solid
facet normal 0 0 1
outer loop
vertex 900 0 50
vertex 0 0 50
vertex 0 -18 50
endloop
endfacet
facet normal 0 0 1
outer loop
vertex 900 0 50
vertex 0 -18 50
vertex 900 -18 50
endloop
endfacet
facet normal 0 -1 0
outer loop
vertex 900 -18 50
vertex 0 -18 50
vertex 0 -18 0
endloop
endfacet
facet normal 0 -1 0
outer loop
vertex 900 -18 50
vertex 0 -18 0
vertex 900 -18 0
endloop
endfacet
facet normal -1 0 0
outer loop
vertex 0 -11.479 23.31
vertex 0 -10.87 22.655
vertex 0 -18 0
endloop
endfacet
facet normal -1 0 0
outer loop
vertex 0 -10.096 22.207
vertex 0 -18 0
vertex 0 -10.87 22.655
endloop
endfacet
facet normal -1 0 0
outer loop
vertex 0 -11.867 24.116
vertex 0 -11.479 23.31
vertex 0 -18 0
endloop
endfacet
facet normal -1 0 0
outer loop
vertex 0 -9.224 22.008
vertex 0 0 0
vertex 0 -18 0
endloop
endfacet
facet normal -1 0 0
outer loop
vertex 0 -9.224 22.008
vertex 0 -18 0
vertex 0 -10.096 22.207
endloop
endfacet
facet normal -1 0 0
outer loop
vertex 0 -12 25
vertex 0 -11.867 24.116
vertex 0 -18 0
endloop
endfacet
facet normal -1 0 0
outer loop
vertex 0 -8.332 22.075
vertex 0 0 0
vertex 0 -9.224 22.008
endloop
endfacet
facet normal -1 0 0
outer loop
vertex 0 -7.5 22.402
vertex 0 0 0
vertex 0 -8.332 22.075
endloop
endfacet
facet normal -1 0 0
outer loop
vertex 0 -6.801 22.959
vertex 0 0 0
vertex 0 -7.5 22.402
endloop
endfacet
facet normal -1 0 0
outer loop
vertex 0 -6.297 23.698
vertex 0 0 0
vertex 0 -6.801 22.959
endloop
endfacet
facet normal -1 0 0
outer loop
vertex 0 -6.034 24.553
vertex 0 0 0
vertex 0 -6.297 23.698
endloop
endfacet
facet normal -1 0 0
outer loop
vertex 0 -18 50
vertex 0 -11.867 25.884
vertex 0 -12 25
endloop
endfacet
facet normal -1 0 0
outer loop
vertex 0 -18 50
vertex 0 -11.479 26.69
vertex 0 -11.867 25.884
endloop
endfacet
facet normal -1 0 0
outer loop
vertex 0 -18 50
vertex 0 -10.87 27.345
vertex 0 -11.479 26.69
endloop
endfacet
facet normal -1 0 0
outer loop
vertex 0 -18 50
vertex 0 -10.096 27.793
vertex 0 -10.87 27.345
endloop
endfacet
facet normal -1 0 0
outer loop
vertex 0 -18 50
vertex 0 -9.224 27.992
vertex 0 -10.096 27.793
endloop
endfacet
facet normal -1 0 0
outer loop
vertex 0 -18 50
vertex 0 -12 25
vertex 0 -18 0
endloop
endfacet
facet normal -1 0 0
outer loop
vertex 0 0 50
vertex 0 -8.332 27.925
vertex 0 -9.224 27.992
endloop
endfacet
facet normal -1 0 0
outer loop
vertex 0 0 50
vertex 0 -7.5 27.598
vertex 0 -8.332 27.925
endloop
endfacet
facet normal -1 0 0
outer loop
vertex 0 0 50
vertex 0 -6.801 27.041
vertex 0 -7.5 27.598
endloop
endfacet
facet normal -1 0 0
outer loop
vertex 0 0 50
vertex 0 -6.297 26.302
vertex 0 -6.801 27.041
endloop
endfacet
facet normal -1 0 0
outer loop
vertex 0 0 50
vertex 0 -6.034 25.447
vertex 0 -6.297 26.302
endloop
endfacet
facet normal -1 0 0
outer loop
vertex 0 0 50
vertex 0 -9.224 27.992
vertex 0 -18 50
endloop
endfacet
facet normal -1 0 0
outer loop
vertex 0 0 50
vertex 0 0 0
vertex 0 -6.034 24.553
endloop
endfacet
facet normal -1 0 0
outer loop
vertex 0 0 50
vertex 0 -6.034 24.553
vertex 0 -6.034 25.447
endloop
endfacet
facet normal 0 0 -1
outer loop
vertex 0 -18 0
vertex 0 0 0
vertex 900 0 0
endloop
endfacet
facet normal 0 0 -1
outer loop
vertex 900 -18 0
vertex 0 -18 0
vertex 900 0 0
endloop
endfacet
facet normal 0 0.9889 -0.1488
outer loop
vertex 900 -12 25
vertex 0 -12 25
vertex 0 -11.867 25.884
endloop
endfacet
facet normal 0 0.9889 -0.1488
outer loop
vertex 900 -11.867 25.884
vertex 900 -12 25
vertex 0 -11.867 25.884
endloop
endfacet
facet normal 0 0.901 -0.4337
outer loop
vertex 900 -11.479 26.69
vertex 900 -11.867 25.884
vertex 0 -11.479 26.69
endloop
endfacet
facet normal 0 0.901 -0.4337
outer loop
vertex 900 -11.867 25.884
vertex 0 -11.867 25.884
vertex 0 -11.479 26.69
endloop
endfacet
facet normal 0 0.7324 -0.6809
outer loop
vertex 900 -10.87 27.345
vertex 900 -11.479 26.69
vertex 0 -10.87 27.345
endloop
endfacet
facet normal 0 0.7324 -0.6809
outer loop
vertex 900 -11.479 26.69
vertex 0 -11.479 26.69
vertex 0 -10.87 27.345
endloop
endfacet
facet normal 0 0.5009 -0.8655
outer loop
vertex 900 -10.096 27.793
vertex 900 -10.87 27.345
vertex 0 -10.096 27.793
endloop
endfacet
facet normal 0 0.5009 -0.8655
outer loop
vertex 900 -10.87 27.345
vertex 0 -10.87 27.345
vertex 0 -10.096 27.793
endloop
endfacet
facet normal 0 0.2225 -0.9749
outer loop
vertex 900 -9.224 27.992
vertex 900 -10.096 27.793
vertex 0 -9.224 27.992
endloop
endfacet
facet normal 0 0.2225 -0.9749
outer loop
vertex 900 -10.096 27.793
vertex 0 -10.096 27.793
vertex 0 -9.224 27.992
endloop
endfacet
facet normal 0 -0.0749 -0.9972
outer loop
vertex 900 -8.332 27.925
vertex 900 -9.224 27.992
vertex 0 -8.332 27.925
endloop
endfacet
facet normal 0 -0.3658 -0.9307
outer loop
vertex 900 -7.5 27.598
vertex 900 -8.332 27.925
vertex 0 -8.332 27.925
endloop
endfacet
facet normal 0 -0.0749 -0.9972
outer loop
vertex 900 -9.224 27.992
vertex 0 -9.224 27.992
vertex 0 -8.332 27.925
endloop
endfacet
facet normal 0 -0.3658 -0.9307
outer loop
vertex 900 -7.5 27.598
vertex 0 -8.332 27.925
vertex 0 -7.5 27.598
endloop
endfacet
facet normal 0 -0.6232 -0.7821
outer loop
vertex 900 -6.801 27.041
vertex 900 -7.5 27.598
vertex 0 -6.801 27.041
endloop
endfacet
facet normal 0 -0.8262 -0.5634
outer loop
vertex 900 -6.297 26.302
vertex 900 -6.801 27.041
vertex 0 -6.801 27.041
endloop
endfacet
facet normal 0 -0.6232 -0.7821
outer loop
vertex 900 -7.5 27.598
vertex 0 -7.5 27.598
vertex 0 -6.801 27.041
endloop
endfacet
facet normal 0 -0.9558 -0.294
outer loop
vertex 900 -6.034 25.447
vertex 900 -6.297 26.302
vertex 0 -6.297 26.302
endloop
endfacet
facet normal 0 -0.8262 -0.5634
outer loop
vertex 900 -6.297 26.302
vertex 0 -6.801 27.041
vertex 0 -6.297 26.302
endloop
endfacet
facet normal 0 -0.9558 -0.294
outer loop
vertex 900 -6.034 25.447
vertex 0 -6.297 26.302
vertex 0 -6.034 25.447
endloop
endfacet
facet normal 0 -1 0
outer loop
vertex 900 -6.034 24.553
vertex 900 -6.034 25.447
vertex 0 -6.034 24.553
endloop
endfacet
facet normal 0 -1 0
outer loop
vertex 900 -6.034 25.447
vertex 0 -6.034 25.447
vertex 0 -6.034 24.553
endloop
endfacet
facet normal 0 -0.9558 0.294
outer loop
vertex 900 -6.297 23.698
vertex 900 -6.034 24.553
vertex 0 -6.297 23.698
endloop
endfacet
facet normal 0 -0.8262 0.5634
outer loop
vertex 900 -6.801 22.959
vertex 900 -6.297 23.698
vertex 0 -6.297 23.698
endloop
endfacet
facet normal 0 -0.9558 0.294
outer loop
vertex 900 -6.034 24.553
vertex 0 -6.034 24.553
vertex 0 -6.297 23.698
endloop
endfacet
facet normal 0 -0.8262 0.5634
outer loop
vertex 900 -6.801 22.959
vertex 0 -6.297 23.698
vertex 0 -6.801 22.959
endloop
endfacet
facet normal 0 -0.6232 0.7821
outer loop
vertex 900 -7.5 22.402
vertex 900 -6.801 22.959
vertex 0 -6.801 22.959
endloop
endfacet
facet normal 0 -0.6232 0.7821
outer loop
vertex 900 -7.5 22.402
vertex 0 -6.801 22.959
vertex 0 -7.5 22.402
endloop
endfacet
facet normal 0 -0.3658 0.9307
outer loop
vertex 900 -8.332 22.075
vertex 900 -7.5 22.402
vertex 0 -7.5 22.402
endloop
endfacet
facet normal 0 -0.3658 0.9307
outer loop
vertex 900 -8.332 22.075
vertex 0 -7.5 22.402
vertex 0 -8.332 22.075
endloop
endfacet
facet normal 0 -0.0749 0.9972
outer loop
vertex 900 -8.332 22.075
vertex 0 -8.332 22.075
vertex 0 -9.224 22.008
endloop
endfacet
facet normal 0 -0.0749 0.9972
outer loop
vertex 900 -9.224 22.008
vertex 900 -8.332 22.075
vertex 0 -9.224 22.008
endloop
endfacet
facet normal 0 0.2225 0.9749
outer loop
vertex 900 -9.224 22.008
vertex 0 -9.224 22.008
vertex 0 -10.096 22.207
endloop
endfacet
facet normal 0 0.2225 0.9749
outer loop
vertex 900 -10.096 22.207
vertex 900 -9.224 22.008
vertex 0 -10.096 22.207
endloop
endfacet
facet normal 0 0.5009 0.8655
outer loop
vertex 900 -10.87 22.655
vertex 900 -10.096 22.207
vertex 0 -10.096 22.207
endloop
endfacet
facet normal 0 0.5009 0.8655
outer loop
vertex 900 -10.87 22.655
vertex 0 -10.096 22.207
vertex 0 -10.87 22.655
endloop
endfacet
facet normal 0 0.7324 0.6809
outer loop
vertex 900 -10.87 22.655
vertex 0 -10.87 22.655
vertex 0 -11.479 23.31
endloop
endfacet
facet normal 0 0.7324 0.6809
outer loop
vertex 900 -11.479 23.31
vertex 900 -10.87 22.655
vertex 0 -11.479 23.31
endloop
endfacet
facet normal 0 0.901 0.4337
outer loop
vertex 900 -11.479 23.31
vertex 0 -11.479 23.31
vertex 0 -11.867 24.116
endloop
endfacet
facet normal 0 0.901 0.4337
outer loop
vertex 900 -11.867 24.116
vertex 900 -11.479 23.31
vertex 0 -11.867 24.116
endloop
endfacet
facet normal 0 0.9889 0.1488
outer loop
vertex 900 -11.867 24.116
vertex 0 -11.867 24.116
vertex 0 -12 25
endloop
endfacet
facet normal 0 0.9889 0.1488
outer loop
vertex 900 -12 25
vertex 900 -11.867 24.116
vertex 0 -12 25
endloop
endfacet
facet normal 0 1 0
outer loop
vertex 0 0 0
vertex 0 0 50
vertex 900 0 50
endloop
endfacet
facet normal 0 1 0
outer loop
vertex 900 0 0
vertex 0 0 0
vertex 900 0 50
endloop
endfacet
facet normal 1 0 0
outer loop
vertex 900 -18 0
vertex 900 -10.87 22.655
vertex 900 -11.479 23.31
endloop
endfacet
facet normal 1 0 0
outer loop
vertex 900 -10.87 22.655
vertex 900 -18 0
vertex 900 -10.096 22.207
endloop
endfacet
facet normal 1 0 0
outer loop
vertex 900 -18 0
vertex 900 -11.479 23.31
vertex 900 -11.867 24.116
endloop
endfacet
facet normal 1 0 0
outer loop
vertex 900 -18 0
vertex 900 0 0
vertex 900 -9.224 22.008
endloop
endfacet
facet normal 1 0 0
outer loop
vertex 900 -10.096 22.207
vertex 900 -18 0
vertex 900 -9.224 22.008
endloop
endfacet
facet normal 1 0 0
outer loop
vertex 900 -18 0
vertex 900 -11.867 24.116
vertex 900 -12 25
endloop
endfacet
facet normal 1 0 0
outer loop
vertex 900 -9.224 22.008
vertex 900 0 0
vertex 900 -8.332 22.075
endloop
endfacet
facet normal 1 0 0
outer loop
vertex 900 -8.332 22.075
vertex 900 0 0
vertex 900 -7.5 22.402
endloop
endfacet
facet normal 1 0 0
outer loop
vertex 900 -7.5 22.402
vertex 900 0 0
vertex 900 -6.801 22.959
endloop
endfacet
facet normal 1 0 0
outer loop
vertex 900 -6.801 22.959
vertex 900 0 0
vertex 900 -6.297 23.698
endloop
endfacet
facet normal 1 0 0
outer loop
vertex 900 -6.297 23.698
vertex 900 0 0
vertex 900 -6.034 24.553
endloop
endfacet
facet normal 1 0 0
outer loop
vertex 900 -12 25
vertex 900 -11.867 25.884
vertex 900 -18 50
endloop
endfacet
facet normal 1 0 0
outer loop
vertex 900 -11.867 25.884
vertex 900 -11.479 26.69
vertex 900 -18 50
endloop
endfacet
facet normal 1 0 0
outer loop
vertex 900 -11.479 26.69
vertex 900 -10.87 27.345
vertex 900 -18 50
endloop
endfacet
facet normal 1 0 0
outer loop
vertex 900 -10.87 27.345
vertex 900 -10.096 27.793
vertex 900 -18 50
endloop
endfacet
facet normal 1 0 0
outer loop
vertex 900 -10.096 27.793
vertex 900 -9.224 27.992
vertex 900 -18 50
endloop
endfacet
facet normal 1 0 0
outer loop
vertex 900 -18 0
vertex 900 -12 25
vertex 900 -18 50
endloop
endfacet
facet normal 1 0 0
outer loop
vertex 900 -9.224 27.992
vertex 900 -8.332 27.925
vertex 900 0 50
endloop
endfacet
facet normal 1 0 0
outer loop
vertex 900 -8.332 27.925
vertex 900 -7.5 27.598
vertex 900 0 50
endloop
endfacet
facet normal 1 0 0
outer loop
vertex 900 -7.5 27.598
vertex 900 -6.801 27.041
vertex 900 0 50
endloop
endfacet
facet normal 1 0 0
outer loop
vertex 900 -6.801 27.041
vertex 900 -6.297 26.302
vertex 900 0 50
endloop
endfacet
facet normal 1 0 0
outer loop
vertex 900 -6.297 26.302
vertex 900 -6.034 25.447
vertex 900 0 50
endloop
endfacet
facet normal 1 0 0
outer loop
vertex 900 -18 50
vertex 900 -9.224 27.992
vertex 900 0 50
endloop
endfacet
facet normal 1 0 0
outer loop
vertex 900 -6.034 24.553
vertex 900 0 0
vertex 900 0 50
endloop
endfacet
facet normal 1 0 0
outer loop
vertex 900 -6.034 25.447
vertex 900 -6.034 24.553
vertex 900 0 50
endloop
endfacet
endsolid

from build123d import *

# Parameters (mm, degrees)
F0_W          = 900
F0_H          = 50
F1_DEPTH      = 18
F2_R          = 3
F3_DEPTH      = 25
F4_DEPTH      = 900.001
F4_DEPTH_BACK = 25


with BuildPart() as f1:
    # F0 (on Front) → F1 (new body)
    with BuildSketch(Plane.XZ):
        with Locations((450, 25)):
            Rectangle(F0_W, F0_H)
    extrude(amount=F1_DEPTH)

    # F2 (on face) → F3 (cut)
    with BuildSketch(Plane(origin=(0, 0, 0), x_dir=(0, -1, 0), z_dir=(-1, 0, 0))):
        with Locations((9, 25)):
            Circle(F2_R)
    extrude(amount=-F3_DEPTH, mode=Mode.SUBTRACT)

    # F2 (on face) → F4 (cut, two sides)
    with BuildSketch(Plane(origin=(0, 0, 0), x_dir=(0, -1, 0), z_dir=(-1, 0, 0))) as f4_sk:
        with Locations((9, 25)):
            Circle(F2_R)
    extrude(amount=-F4_DEPTH, mode=Mode.SUBTRACT)
    extrude(f4_sk.sketch, amount=-F4_DEPTH_BACK, mode=Mode.SUBTRACT)


solid = f1.part
